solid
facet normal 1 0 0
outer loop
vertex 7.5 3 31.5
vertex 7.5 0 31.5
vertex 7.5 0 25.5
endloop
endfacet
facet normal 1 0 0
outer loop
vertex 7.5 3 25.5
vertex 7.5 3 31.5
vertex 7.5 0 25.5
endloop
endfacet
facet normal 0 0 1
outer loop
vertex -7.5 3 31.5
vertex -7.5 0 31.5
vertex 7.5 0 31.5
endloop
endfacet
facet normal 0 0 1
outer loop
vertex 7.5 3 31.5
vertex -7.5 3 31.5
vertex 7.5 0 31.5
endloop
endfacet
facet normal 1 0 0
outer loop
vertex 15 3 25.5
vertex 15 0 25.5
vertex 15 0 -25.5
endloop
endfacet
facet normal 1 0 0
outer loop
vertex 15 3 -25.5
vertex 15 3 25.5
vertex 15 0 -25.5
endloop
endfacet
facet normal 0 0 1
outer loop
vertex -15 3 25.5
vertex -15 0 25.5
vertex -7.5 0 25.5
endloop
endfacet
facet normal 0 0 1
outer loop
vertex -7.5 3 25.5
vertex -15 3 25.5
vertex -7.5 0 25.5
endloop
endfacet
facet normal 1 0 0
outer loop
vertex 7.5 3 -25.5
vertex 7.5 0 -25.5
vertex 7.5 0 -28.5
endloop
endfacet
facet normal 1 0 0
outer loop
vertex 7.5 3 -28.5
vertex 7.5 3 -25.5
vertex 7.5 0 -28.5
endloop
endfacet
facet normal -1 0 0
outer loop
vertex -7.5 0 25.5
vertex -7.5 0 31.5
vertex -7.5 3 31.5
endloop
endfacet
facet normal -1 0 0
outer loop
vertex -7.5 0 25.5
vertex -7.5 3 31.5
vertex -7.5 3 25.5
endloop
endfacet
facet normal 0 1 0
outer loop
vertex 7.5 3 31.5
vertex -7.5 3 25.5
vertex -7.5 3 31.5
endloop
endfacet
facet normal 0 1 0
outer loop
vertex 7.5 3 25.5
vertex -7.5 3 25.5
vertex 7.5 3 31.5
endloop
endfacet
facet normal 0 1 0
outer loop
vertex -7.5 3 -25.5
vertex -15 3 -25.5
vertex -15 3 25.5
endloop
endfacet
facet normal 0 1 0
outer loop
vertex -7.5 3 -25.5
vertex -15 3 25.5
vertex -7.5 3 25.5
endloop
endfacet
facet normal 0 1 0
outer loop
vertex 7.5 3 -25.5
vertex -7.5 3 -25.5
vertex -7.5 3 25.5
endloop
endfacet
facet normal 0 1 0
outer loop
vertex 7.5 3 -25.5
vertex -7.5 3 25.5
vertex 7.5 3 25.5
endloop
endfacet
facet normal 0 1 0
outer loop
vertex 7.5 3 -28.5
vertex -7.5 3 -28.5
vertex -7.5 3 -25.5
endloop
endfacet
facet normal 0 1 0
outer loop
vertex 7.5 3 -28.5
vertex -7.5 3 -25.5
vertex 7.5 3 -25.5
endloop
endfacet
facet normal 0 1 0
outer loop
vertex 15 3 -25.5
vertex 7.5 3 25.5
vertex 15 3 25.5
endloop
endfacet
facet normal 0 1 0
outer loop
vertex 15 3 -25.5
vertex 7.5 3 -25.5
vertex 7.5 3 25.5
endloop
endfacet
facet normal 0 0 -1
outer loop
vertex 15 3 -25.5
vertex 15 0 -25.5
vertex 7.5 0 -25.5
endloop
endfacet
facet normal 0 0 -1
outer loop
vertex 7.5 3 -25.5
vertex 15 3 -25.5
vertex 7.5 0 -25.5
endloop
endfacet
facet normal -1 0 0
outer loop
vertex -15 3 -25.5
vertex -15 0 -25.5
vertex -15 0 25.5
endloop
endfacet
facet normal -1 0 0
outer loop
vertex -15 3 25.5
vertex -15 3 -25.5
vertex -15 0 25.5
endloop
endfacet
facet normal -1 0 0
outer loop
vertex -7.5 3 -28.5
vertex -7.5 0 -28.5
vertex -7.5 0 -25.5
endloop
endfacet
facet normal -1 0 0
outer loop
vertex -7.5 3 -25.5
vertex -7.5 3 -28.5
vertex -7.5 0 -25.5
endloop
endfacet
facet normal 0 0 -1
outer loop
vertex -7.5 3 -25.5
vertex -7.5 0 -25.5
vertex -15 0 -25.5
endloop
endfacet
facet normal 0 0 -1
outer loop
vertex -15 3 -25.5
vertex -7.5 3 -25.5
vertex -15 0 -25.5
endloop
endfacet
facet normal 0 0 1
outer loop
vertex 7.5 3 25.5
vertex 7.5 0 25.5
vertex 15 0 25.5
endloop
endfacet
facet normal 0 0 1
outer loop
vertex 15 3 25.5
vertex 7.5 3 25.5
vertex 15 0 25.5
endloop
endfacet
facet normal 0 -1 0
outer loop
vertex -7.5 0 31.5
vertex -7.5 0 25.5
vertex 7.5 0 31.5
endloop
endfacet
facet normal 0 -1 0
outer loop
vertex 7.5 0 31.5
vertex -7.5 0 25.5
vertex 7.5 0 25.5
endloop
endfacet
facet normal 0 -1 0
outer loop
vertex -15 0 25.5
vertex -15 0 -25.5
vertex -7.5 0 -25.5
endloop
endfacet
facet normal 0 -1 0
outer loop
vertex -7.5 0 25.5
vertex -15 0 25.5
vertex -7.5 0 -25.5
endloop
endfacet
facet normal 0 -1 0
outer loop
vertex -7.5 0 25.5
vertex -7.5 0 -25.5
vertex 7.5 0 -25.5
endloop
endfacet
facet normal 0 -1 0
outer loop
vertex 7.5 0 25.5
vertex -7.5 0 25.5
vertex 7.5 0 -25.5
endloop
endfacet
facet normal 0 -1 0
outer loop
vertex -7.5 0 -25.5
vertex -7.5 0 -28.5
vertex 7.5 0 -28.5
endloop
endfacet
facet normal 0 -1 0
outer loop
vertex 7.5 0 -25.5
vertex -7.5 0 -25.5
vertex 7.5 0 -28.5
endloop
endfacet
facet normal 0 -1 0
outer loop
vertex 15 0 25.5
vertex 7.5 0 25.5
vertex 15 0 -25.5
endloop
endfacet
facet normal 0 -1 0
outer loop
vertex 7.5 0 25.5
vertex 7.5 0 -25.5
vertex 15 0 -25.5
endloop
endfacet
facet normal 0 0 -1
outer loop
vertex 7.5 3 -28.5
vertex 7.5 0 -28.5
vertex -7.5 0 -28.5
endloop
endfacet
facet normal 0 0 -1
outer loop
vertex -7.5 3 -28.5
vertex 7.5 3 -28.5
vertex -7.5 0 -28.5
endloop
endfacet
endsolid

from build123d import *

# Parameters (mm, degrees)
SKETCH1_W           = 7.5
SKETCH1_H           = 6
BOSS_EXTRUDE1_DEPTH = 3


with BuildPart() as part:
    # Sketch1 → Boss-Extrude1 (new body)
    with BuildSketch(Plane(origin=(0, 0, 0), x_dir=(1, 0, 0), z_dir=(0, 1, 0))):
        Polygon((0, 0), (0, 25.5), (-7.5, 25.5), (-15, 25.5), (-15, -12.75), (0, -12.75), align=None)
        Polygon((0, -25.5), (0, -12.75), (-15, -12.75), (-15, -25.5), (-7.5, -25.5), align=None)
        Polygon((15, -12.75), (0, -12.75), (0, -25.5), (7.5, -25.5), (15, -25.5), align=None)
        Polygon((7.5, 25.5), (0, 25.5), (0, 0), (0, -12.75), (15, -12.75), (15, 25.5), align=None)
        Polygon((-7.5, 25.5), (0, 25.5), (7.5, 25.5), (7.5, 28.5), (-7.5, 28.5), align=None)
        Polygon((-7.5, 25.5), (0, 25.5), (7.5, 25.5), (7.5, 28.5), (-7.5, 28.5), align=None)
        with Locations((-3.75, -28.5)):
            Rectangle(SKETCH1_W, SKETCH1_H)
        with Locations((3.75, -28.5)):
            Rectangle(SKETCH1_W, SKETCH1_H)
    extrude(amount=BOSS_EXTRUDE1_DEPTH)


solid = part.part
